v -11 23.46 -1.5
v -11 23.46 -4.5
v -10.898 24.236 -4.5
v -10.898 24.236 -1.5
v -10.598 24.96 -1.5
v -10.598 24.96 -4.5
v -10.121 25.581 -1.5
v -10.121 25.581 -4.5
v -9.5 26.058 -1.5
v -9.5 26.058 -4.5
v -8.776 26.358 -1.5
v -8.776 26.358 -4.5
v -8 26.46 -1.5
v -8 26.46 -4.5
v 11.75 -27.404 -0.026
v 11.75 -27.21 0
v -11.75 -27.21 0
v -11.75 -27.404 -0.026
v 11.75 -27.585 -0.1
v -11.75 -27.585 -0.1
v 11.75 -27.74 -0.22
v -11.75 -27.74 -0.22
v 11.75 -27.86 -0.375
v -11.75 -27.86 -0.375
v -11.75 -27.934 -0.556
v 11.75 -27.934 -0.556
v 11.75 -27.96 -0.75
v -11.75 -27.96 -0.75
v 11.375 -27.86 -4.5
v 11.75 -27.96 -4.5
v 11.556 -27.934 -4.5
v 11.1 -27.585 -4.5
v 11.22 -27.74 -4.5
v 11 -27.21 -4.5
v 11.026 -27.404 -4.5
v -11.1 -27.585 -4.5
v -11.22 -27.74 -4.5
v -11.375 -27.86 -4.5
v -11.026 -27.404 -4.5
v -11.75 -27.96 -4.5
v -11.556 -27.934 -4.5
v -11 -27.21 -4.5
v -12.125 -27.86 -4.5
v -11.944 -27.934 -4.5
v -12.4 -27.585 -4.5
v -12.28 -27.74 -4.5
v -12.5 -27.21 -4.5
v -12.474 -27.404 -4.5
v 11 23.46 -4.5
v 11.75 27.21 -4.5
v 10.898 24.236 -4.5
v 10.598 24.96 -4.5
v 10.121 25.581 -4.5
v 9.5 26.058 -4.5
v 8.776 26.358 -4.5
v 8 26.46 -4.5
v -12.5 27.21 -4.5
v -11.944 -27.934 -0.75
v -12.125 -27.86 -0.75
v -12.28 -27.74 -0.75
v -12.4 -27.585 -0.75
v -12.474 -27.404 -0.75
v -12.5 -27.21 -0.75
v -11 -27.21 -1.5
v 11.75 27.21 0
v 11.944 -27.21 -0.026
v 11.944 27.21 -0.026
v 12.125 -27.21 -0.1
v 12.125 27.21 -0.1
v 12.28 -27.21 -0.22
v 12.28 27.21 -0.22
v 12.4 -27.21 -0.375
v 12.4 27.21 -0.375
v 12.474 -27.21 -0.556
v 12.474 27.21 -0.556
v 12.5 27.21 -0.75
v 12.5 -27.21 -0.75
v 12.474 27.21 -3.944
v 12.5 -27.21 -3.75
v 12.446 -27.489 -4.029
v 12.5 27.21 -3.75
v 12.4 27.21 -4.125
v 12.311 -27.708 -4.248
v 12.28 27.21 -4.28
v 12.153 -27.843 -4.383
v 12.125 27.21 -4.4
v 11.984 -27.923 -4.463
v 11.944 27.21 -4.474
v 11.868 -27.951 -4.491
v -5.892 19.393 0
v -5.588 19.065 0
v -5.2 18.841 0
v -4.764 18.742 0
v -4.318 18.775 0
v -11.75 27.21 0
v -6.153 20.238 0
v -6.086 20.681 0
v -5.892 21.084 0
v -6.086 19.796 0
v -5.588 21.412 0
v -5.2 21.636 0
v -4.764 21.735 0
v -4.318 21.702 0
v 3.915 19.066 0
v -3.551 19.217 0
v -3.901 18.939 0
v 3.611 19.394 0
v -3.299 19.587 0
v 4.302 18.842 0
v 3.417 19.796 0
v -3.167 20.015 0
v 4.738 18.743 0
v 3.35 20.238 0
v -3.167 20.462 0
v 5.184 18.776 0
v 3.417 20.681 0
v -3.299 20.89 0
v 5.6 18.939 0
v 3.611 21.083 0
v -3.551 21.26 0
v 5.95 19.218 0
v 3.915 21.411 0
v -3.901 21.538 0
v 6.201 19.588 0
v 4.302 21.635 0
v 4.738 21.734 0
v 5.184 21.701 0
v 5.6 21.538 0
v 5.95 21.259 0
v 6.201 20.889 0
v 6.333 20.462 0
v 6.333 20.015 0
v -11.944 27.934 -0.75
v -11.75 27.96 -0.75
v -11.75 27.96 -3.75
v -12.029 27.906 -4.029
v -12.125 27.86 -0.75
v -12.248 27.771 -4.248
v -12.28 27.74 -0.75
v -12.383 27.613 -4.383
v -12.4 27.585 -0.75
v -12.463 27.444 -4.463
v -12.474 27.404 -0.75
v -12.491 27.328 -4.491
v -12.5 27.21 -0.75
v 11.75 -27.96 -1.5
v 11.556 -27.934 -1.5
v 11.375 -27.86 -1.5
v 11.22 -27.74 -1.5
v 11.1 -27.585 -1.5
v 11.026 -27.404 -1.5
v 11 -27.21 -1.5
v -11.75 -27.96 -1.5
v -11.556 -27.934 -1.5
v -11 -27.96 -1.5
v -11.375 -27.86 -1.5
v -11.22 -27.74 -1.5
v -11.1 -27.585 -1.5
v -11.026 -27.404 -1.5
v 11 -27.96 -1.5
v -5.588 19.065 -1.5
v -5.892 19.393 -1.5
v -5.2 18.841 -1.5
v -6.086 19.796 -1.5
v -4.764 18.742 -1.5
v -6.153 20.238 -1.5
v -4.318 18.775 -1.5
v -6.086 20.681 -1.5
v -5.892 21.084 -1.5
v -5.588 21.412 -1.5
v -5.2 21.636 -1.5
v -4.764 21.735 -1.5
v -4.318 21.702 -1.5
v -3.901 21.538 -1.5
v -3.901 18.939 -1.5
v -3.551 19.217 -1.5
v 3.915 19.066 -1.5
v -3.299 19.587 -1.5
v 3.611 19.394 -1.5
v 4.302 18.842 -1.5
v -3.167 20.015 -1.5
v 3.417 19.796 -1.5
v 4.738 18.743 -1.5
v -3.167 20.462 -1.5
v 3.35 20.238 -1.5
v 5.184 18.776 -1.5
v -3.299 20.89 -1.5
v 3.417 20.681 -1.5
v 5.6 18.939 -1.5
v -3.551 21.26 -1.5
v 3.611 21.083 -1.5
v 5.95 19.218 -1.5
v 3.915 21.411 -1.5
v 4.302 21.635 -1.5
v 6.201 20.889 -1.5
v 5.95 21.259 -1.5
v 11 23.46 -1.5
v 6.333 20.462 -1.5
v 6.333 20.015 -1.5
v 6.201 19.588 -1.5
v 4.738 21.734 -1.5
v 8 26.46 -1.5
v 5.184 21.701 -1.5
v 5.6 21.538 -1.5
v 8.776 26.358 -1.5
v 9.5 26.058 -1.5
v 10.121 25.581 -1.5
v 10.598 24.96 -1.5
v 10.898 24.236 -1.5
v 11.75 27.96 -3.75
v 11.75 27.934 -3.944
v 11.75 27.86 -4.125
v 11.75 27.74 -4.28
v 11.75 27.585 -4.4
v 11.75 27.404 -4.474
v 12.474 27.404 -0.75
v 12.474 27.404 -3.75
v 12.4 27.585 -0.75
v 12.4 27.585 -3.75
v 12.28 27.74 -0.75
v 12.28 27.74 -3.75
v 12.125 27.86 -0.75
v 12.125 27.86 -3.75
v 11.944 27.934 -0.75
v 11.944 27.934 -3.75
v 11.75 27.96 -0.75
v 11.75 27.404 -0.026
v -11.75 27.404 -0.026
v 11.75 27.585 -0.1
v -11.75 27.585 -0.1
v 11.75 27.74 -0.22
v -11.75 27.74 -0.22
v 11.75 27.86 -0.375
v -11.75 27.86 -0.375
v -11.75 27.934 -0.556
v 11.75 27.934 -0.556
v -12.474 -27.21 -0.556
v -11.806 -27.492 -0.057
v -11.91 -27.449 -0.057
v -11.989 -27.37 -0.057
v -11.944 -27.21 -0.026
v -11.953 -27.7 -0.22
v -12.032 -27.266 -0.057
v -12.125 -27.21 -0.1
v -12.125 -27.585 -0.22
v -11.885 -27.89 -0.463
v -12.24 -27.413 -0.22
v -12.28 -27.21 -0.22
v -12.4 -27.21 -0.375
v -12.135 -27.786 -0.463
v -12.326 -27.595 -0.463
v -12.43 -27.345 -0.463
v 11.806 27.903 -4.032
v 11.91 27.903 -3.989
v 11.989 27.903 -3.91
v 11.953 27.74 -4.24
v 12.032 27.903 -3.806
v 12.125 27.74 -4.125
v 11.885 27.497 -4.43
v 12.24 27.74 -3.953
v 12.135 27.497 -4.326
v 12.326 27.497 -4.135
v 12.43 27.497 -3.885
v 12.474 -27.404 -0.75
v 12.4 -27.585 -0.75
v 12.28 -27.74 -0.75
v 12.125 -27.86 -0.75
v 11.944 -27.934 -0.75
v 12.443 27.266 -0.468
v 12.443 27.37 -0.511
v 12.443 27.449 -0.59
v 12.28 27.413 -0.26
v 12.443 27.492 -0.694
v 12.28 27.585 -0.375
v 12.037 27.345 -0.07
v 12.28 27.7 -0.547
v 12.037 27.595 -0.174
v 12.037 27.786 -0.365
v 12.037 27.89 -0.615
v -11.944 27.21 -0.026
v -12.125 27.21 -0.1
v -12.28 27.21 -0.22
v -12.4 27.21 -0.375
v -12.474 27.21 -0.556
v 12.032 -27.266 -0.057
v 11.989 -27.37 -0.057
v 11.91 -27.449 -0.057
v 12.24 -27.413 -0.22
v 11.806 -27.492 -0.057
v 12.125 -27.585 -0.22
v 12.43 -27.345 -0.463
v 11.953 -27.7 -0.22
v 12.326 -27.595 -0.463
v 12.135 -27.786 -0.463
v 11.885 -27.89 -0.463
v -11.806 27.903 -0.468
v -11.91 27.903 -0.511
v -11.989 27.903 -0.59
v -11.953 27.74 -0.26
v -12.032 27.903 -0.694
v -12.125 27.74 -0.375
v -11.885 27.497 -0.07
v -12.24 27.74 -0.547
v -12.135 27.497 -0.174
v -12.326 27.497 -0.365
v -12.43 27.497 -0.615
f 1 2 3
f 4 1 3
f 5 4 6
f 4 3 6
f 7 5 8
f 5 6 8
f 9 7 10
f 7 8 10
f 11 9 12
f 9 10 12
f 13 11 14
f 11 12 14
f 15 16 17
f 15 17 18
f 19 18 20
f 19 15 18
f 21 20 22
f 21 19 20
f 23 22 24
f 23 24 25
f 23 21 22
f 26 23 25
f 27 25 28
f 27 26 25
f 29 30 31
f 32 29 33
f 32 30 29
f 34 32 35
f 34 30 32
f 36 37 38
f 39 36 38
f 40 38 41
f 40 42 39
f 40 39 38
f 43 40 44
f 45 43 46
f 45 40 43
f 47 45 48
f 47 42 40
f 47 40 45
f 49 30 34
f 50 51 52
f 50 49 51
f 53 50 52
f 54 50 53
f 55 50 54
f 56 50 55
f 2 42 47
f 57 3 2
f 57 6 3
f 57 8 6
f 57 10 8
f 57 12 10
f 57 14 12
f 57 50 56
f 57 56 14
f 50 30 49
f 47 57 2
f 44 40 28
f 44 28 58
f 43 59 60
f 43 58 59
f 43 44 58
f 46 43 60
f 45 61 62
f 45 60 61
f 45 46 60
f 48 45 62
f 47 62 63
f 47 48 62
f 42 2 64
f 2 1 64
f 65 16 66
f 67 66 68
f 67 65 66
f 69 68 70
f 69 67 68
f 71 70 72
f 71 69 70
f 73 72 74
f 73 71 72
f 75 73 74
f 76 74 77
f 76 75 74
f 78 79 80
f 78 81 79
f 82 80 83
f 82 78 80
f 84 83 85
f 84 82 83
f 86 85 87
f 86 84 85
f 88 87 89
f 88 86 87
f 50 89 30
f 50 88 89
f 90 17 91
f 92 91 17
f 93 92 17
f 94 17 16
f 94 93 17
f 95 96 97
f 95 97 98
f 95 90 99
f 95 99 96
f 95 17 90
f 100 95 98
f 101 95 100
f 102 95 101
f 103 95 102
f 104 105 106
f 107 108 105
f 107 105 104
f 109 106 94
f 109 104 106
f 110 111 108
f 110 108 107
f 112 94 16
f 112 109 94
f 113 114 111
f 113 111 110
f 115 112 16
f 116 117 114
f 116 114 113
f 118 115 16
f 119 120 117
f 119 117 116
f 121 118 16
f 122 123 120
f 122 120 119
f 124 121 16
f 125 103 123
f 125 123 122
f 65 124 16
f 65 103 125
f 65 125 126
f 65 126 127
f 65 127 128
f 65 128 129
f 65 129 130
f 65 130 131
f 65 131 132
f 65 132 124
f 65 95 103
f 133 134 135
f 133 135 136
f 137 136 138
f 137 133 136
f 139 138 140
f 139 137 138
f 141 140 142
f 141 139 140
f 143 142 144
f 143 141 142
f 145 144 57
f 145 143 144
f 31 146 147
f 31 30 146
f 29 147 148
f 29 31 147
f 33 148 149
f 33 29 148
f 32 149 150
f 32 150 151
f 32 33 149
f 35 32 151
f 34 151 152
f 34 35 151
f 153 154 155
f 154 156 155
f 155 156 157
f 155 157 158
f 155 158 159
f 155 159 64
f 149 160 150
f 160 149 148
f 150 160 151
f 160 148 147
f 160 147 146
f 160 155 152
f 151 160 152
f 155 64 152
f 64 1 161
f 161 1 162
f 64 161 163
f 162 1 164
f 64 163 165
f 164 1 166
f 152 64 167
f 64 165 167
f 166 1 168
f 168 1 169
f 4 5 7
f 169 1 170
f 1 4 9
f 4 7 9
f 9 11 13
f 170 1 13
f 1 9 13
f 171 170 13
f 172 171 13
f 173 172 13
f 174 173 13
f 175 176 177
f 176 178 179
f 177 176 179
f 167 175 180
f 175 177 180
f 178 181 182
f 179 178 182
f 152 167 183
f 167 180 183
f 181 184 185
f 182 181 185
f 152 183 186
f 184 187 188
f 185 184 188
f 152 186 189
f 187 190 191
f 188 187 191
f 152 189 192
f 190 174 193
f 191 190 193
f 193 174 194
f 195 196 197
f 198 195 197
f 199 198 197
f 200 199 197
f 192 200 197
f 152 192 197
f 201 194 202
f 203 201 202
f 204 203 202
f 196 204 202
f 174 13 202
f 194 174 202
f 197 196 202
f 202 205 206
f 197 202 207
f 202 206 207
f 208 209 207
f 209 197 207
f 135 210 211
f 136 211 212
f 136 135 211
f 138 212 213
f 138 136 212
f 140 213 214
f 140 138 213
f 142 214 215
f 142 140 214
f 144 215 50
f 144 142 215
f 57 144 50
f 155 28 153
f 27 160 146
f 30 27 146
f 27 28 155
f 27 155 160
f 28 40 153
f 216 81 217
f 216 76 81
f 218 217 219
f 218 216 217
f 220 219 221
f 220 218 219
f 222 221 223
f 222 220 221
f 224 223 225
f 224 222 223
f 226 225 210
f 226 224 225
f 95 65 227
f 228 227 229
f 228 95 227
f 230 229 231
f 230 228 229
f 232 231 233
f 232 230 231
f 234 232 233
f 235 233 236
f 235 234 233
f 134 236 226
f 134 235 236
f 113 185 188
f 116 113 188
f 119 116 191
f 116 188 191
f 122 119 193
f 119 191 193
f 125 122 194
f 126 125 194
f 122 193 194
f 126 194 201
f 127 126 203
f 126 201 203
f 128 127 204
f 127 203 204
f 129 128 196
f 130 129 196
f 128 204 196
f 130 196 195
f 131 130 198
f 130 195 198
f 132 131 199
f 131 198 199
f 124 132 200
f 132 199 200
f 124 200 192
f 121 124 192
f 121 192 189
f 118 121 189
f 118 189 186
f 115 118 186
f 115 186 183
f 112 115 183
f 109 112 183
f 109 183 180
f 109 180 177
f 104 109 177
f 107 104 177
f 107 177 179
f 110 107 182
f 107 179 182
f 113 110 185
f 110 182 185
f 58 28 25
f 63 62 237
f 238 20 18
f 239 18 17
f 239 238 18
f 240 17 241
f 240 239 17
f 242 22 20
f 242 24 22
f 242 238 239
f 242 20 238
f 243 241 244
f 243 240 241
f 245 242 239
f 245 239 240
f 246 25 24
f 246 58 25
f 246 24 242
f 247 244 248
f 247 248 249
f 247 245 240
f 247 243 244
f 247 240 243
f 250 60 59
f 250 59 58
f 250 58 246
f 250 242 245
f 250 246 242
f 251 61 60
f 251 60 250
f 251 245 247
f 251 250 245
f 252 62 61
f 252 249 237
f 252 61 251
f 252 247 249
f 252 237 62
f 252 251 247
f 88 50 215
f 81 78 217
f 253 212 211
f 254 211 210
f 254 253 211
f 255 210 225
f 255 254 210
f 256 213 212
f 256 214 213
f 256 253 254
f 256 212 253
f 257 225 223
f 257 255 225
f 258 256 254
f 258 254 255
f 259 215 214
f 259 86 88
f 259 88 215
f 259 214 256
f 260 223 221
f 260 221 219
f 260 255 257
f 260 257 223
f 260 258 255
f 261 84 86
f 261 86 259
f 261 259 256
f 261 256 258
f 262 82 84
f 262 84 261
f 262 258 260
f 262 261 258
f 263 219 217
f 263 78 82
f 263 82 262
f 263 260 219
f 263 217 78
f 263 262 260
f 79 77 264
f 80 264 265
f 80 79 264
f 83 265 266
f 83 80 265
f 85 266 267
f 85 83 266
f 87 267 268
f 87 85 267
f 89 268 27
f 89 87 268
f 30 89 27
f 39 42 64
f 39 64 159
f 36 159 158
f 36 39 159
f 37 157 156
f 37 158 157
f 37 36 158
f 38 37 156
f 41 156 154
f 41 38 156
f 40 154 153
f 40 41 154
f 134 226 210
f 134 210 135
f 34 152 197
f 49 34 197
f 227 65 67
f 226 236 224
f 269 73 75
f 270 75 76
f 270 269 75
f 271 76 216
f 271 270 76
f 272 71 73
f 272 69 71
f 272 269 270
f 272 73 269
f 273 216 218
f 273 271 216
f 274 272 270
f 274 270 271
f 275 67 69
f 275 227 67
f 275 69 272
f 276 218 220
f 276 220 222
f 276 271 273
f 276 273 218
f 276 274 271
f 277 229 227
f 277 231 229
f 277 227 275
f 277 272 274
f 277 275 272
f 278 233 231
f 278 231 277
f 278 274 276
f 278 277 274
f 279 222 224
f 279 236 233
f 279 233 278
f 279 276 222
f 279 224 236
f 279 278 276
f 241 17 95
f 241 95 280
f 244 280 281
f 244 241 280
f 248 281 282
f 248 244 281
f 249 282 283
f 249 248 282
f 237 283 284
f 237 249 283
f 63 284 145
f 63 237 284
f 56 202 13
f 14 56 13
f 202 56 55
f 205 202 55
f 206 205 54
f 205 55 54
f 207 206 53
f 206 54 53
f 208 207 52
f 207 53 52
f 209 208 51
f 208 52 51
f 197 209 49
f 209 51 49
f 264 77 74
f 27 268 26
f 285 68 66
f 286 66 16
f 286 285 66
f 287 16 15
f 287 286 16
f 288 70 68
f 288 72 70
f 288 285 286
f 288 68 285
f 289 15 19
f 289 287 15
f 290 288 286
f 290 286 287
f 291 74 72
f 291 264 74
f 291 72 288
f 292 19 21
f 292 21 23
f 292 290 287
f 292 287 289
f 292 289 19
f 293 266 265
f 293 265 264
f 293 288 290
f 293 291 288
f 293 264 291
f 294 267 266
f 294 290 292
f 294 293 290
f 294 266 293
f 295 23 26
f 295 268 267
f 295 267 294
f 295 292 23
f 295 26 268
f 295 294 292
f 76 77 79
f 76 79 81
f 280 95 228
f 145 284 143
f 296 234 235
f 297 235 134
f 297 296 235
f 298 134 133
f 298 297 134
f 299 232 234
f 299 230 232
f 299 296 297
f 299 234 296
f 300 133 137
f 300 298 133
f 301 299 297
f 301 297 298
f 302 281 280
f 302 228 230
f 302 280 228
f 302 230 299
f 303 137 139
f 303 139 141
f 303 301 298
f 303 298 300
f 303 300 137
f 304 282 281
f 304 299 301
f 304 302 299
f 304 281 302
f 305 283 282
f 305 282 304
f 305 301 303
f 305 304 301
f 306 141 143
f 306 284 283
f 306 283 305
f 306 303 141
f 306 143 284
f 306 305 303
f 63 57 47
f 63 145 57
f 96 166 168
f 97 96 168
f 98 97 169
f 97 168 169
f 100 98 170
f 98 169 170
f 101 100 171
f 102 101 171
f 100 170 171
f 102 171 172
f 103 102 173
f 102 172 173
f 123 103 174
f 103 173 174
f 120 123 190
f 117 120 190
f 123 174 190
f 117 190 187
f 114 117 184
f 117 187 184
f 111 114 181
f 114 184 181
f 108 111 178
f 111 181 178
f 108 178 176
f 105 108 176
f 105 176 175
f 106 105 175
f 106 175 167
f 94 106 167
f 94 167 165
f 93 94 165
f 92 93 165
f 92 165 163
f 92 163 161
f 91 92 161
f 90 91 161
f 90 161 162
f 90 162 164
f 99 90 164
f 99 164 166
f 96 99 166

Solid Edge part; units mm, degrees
sketch "Sketch1" plane through (0, 0, 0) normal (0, 0, 1) x (1, 0, 0)
  line L0 (12.5, -27.96) -> (12.5, 27.96)
  line L1 (12.5, 27.96) -> (-12.5, 27.96)
  line L2 (-12.5, 27.96) -> (-12.5, -27.96)
  line L3 (-12.5, -27.96) -> (12.5, -27.96)
extrude "Protrusion1" add sketch "Sketch1" against normal blind 1.5
sketch "Sketch2" plane through (0, 0, -1.5) normal (0, 0, -1) x (0, 1, 0)
  line L0 (-26.46, 11) -> (26.46, 11)
  line L1 (26.46, 11) -> (26.46, -11)
  line L2 (26.46, -11) -> (-26.46, -11)
  line L3 (-26.46, -11) -> (-27.96, -11)
  line L4 (-27.96, -11) -> (-27.96, -12.5)
  line L5 (27.96, -12.5) -> (-27.96, -12.5)
  line L6 (27.96, 12.5) -> (27.96, -12.5)
  line L7 (-27.96, 12.5) -> (27.96, 12.5)
  line L8 (-27.96, 11) -> (-27.96, 12.5)
  line L9 (-26.46, 11) -> (-27.96, 11)
extrude "ExtrudedProtrusion_2" add sketch "Sketch2" along normal blind 3
sketch "Sketch3" plane through (0, -0.75, -1.5) normal (0, 0, -1) x (-1, 0, 0)
  circle A0 centre (4.6516, 20.9885) radius 1.5011
  circle A1 centre (-4.85, 20.9885) radius 1.5
extrude "Cutout1" cut sketch "Sketch3" against normal up to vertex (1.5 mm away)
fillet "Round_1" radius 0.75 12 edges at (12.5, -27.96, -2.25) (-12.5, -27.96, -2.25) (-12.5, 0, 0) (0, -27.96, 0) (-11, -27.96, -3) (11, -27.96, -3) (-12.5, 27.96, -2.25) (0, 27.96, 0) (12.5, 0, 0) (12.5, 0, -4.5) (12.5, 27.96, -2.25) (0, 27.96, -4.5)
fillet "Round_2" radius 3 2 edges at (-11, 26.46, -3) (11, 26.46, -3)
properties material "ABS Plastic, medium impact"
